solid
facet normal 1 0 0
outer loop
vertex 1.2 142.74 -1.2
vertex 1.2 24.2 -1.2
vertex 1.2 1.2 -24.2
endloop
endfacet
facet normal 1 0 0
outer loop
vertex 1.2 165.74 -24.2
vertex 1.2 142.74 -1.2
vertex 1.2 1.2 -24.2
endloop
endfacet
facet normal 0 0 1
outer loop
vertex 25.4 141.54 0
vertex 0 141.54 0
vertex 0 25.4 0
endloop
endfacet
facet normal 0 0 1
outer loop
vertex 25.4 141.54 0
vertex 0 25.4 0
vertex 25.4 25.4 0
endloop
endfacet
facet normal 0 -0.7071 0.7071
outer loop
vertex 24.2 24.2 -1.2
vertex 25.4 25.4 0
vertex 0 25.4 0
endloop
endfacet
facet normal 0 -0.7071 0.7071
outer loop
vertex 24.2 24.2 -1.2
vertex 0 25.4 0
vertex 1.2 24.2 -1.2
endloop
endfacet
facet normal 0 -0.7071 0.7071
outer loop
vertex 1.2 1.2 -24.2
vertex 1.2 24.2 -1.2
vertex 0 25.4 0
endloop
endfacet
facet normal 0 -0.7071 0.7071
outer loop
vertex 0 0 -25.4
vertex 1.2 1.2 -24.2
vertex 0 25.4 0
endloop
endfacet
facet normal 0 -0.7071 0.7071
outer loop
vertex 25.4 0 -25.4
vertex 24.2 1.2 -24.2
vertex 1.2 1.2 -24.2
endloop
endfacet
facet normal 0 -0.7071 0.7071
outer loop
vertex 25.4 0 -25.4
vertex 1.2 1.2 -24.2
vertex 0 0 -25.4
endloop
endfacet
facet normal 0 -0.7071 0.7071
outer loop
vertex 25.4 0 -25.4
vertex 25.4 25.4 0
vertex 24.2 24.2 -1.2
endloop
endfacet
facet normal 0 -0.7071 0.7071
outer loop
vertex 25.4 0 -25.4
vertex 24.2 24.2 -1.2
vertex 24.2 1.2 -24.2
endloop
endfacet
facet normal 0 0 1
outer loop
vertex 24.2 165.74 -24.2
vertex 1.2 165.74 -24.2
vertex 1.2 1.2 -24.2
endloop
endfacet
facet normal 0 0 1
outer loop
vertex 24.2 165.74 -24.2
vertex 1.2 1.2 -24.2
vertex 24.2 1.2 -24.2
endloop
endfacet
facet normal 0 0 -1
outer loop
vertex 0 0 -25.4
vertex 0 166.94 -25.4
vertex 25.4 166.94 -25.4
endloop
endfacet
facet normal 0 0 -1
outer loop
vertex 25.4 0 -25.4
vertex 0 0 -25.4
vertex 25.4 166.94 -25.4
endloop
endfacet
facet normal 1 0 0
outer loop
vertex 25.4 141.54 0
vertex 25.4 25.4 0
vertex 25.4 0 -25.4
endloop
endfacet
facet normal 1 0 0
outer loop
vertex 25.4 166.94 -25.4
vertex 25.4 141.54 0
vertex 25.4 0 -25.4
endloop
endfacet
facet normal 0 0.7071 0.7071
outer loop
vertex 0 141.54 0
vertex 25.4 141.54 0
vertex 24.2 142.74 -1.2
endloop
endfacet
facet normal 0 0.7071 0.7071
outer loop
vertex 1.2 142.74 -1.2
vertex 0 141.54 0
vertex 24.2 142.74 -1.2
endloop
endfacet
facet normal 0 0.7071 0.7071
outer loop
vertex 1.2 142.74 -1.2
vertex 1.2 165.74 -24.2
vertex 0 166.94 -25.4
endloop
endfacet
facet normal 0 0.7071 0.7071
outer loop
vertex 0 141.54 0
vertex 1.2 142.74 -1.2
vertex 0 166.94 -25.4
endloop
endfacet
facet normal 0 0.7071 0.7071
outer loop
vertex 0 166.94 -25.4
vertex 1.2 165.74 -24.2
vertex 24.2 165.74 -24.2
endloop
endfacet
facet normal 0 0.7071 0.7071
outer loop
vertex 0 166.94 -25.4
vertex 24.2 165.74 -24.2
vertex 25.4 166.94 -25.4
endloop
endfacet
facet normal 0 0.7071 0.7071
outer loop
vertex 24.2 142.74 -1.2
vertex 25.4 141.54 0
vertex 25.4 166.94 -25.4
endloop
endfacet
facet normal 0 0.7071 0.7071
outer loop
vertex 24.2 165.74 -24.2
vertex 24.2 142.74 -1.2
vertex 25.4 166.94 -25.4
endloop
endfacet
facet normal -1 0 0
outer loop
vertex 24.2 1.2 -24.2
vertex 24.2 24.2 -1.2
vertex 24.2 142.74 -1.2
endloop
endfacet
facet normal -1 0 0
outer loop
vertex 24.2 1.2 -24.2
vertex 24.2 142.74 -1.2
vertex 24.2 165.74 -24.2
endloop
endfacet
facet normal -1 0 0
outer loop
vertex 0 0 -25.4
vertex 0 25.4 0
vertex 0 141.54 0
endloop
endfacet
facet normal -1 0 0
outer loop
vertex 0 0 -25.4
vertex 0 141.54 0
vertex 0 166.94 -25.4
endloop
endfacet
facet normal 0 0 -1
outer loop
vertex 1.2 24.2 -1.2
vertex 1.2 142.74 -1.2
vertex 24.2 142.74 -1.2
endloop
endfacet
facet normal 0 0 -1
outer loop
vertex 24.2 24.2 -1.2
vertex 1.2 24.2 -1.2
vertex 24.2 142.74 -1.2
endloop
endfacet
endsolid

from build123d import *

# Parameters (mm, degrees)
SKETCH1_W           = 25.4
SKETCH1_H           = 25.4
SKETCH1_W_2         = 23
SKETCH1_H_2         = 23
BOSS_EXTRUDE1_DEPTH = 166.94
CUT_EXTRUDE1_DEPTH  = 26.4


with BuildPart() as part:
    # Sketch1 → Boss-Extrude1 (new body)
    with BuildSketch(Plane(origin=(0, 0, 0), x_dir=(1, 0, 0), z_dir=(0, 1, 0))):
        with Locations((12.7, 12.7)):
            Rectangle(SKETCH1_W, SKETCH1_H)
        with Locations((12.7, 12.7)):
            Rectangle(SKETCH1_W_2, SKETCH1_H_2, mode=Mode.SUBTRACT)
    extrude(amount=BOSS_EXTRUDE1_DEPTH)

    # Sketch2 → Cut-Extrude1 (cut, through all)
    with BuildSketch(Plane(origin=(25.4, 0, 0), x_dir=(0, 0, -1), z_dir=(1, 0, 0))):
        Polygon((25.4, 166.94), (0, 166.94), (0, 141.54), align=None)
        Polygon((0, 0), (0, 25.4), (25.4, 0), align=None)
    extrude(amount=-CUT_EXTRUDE1_DEPTH, mode=Mode.SUBTRACT)


solid = part.part
